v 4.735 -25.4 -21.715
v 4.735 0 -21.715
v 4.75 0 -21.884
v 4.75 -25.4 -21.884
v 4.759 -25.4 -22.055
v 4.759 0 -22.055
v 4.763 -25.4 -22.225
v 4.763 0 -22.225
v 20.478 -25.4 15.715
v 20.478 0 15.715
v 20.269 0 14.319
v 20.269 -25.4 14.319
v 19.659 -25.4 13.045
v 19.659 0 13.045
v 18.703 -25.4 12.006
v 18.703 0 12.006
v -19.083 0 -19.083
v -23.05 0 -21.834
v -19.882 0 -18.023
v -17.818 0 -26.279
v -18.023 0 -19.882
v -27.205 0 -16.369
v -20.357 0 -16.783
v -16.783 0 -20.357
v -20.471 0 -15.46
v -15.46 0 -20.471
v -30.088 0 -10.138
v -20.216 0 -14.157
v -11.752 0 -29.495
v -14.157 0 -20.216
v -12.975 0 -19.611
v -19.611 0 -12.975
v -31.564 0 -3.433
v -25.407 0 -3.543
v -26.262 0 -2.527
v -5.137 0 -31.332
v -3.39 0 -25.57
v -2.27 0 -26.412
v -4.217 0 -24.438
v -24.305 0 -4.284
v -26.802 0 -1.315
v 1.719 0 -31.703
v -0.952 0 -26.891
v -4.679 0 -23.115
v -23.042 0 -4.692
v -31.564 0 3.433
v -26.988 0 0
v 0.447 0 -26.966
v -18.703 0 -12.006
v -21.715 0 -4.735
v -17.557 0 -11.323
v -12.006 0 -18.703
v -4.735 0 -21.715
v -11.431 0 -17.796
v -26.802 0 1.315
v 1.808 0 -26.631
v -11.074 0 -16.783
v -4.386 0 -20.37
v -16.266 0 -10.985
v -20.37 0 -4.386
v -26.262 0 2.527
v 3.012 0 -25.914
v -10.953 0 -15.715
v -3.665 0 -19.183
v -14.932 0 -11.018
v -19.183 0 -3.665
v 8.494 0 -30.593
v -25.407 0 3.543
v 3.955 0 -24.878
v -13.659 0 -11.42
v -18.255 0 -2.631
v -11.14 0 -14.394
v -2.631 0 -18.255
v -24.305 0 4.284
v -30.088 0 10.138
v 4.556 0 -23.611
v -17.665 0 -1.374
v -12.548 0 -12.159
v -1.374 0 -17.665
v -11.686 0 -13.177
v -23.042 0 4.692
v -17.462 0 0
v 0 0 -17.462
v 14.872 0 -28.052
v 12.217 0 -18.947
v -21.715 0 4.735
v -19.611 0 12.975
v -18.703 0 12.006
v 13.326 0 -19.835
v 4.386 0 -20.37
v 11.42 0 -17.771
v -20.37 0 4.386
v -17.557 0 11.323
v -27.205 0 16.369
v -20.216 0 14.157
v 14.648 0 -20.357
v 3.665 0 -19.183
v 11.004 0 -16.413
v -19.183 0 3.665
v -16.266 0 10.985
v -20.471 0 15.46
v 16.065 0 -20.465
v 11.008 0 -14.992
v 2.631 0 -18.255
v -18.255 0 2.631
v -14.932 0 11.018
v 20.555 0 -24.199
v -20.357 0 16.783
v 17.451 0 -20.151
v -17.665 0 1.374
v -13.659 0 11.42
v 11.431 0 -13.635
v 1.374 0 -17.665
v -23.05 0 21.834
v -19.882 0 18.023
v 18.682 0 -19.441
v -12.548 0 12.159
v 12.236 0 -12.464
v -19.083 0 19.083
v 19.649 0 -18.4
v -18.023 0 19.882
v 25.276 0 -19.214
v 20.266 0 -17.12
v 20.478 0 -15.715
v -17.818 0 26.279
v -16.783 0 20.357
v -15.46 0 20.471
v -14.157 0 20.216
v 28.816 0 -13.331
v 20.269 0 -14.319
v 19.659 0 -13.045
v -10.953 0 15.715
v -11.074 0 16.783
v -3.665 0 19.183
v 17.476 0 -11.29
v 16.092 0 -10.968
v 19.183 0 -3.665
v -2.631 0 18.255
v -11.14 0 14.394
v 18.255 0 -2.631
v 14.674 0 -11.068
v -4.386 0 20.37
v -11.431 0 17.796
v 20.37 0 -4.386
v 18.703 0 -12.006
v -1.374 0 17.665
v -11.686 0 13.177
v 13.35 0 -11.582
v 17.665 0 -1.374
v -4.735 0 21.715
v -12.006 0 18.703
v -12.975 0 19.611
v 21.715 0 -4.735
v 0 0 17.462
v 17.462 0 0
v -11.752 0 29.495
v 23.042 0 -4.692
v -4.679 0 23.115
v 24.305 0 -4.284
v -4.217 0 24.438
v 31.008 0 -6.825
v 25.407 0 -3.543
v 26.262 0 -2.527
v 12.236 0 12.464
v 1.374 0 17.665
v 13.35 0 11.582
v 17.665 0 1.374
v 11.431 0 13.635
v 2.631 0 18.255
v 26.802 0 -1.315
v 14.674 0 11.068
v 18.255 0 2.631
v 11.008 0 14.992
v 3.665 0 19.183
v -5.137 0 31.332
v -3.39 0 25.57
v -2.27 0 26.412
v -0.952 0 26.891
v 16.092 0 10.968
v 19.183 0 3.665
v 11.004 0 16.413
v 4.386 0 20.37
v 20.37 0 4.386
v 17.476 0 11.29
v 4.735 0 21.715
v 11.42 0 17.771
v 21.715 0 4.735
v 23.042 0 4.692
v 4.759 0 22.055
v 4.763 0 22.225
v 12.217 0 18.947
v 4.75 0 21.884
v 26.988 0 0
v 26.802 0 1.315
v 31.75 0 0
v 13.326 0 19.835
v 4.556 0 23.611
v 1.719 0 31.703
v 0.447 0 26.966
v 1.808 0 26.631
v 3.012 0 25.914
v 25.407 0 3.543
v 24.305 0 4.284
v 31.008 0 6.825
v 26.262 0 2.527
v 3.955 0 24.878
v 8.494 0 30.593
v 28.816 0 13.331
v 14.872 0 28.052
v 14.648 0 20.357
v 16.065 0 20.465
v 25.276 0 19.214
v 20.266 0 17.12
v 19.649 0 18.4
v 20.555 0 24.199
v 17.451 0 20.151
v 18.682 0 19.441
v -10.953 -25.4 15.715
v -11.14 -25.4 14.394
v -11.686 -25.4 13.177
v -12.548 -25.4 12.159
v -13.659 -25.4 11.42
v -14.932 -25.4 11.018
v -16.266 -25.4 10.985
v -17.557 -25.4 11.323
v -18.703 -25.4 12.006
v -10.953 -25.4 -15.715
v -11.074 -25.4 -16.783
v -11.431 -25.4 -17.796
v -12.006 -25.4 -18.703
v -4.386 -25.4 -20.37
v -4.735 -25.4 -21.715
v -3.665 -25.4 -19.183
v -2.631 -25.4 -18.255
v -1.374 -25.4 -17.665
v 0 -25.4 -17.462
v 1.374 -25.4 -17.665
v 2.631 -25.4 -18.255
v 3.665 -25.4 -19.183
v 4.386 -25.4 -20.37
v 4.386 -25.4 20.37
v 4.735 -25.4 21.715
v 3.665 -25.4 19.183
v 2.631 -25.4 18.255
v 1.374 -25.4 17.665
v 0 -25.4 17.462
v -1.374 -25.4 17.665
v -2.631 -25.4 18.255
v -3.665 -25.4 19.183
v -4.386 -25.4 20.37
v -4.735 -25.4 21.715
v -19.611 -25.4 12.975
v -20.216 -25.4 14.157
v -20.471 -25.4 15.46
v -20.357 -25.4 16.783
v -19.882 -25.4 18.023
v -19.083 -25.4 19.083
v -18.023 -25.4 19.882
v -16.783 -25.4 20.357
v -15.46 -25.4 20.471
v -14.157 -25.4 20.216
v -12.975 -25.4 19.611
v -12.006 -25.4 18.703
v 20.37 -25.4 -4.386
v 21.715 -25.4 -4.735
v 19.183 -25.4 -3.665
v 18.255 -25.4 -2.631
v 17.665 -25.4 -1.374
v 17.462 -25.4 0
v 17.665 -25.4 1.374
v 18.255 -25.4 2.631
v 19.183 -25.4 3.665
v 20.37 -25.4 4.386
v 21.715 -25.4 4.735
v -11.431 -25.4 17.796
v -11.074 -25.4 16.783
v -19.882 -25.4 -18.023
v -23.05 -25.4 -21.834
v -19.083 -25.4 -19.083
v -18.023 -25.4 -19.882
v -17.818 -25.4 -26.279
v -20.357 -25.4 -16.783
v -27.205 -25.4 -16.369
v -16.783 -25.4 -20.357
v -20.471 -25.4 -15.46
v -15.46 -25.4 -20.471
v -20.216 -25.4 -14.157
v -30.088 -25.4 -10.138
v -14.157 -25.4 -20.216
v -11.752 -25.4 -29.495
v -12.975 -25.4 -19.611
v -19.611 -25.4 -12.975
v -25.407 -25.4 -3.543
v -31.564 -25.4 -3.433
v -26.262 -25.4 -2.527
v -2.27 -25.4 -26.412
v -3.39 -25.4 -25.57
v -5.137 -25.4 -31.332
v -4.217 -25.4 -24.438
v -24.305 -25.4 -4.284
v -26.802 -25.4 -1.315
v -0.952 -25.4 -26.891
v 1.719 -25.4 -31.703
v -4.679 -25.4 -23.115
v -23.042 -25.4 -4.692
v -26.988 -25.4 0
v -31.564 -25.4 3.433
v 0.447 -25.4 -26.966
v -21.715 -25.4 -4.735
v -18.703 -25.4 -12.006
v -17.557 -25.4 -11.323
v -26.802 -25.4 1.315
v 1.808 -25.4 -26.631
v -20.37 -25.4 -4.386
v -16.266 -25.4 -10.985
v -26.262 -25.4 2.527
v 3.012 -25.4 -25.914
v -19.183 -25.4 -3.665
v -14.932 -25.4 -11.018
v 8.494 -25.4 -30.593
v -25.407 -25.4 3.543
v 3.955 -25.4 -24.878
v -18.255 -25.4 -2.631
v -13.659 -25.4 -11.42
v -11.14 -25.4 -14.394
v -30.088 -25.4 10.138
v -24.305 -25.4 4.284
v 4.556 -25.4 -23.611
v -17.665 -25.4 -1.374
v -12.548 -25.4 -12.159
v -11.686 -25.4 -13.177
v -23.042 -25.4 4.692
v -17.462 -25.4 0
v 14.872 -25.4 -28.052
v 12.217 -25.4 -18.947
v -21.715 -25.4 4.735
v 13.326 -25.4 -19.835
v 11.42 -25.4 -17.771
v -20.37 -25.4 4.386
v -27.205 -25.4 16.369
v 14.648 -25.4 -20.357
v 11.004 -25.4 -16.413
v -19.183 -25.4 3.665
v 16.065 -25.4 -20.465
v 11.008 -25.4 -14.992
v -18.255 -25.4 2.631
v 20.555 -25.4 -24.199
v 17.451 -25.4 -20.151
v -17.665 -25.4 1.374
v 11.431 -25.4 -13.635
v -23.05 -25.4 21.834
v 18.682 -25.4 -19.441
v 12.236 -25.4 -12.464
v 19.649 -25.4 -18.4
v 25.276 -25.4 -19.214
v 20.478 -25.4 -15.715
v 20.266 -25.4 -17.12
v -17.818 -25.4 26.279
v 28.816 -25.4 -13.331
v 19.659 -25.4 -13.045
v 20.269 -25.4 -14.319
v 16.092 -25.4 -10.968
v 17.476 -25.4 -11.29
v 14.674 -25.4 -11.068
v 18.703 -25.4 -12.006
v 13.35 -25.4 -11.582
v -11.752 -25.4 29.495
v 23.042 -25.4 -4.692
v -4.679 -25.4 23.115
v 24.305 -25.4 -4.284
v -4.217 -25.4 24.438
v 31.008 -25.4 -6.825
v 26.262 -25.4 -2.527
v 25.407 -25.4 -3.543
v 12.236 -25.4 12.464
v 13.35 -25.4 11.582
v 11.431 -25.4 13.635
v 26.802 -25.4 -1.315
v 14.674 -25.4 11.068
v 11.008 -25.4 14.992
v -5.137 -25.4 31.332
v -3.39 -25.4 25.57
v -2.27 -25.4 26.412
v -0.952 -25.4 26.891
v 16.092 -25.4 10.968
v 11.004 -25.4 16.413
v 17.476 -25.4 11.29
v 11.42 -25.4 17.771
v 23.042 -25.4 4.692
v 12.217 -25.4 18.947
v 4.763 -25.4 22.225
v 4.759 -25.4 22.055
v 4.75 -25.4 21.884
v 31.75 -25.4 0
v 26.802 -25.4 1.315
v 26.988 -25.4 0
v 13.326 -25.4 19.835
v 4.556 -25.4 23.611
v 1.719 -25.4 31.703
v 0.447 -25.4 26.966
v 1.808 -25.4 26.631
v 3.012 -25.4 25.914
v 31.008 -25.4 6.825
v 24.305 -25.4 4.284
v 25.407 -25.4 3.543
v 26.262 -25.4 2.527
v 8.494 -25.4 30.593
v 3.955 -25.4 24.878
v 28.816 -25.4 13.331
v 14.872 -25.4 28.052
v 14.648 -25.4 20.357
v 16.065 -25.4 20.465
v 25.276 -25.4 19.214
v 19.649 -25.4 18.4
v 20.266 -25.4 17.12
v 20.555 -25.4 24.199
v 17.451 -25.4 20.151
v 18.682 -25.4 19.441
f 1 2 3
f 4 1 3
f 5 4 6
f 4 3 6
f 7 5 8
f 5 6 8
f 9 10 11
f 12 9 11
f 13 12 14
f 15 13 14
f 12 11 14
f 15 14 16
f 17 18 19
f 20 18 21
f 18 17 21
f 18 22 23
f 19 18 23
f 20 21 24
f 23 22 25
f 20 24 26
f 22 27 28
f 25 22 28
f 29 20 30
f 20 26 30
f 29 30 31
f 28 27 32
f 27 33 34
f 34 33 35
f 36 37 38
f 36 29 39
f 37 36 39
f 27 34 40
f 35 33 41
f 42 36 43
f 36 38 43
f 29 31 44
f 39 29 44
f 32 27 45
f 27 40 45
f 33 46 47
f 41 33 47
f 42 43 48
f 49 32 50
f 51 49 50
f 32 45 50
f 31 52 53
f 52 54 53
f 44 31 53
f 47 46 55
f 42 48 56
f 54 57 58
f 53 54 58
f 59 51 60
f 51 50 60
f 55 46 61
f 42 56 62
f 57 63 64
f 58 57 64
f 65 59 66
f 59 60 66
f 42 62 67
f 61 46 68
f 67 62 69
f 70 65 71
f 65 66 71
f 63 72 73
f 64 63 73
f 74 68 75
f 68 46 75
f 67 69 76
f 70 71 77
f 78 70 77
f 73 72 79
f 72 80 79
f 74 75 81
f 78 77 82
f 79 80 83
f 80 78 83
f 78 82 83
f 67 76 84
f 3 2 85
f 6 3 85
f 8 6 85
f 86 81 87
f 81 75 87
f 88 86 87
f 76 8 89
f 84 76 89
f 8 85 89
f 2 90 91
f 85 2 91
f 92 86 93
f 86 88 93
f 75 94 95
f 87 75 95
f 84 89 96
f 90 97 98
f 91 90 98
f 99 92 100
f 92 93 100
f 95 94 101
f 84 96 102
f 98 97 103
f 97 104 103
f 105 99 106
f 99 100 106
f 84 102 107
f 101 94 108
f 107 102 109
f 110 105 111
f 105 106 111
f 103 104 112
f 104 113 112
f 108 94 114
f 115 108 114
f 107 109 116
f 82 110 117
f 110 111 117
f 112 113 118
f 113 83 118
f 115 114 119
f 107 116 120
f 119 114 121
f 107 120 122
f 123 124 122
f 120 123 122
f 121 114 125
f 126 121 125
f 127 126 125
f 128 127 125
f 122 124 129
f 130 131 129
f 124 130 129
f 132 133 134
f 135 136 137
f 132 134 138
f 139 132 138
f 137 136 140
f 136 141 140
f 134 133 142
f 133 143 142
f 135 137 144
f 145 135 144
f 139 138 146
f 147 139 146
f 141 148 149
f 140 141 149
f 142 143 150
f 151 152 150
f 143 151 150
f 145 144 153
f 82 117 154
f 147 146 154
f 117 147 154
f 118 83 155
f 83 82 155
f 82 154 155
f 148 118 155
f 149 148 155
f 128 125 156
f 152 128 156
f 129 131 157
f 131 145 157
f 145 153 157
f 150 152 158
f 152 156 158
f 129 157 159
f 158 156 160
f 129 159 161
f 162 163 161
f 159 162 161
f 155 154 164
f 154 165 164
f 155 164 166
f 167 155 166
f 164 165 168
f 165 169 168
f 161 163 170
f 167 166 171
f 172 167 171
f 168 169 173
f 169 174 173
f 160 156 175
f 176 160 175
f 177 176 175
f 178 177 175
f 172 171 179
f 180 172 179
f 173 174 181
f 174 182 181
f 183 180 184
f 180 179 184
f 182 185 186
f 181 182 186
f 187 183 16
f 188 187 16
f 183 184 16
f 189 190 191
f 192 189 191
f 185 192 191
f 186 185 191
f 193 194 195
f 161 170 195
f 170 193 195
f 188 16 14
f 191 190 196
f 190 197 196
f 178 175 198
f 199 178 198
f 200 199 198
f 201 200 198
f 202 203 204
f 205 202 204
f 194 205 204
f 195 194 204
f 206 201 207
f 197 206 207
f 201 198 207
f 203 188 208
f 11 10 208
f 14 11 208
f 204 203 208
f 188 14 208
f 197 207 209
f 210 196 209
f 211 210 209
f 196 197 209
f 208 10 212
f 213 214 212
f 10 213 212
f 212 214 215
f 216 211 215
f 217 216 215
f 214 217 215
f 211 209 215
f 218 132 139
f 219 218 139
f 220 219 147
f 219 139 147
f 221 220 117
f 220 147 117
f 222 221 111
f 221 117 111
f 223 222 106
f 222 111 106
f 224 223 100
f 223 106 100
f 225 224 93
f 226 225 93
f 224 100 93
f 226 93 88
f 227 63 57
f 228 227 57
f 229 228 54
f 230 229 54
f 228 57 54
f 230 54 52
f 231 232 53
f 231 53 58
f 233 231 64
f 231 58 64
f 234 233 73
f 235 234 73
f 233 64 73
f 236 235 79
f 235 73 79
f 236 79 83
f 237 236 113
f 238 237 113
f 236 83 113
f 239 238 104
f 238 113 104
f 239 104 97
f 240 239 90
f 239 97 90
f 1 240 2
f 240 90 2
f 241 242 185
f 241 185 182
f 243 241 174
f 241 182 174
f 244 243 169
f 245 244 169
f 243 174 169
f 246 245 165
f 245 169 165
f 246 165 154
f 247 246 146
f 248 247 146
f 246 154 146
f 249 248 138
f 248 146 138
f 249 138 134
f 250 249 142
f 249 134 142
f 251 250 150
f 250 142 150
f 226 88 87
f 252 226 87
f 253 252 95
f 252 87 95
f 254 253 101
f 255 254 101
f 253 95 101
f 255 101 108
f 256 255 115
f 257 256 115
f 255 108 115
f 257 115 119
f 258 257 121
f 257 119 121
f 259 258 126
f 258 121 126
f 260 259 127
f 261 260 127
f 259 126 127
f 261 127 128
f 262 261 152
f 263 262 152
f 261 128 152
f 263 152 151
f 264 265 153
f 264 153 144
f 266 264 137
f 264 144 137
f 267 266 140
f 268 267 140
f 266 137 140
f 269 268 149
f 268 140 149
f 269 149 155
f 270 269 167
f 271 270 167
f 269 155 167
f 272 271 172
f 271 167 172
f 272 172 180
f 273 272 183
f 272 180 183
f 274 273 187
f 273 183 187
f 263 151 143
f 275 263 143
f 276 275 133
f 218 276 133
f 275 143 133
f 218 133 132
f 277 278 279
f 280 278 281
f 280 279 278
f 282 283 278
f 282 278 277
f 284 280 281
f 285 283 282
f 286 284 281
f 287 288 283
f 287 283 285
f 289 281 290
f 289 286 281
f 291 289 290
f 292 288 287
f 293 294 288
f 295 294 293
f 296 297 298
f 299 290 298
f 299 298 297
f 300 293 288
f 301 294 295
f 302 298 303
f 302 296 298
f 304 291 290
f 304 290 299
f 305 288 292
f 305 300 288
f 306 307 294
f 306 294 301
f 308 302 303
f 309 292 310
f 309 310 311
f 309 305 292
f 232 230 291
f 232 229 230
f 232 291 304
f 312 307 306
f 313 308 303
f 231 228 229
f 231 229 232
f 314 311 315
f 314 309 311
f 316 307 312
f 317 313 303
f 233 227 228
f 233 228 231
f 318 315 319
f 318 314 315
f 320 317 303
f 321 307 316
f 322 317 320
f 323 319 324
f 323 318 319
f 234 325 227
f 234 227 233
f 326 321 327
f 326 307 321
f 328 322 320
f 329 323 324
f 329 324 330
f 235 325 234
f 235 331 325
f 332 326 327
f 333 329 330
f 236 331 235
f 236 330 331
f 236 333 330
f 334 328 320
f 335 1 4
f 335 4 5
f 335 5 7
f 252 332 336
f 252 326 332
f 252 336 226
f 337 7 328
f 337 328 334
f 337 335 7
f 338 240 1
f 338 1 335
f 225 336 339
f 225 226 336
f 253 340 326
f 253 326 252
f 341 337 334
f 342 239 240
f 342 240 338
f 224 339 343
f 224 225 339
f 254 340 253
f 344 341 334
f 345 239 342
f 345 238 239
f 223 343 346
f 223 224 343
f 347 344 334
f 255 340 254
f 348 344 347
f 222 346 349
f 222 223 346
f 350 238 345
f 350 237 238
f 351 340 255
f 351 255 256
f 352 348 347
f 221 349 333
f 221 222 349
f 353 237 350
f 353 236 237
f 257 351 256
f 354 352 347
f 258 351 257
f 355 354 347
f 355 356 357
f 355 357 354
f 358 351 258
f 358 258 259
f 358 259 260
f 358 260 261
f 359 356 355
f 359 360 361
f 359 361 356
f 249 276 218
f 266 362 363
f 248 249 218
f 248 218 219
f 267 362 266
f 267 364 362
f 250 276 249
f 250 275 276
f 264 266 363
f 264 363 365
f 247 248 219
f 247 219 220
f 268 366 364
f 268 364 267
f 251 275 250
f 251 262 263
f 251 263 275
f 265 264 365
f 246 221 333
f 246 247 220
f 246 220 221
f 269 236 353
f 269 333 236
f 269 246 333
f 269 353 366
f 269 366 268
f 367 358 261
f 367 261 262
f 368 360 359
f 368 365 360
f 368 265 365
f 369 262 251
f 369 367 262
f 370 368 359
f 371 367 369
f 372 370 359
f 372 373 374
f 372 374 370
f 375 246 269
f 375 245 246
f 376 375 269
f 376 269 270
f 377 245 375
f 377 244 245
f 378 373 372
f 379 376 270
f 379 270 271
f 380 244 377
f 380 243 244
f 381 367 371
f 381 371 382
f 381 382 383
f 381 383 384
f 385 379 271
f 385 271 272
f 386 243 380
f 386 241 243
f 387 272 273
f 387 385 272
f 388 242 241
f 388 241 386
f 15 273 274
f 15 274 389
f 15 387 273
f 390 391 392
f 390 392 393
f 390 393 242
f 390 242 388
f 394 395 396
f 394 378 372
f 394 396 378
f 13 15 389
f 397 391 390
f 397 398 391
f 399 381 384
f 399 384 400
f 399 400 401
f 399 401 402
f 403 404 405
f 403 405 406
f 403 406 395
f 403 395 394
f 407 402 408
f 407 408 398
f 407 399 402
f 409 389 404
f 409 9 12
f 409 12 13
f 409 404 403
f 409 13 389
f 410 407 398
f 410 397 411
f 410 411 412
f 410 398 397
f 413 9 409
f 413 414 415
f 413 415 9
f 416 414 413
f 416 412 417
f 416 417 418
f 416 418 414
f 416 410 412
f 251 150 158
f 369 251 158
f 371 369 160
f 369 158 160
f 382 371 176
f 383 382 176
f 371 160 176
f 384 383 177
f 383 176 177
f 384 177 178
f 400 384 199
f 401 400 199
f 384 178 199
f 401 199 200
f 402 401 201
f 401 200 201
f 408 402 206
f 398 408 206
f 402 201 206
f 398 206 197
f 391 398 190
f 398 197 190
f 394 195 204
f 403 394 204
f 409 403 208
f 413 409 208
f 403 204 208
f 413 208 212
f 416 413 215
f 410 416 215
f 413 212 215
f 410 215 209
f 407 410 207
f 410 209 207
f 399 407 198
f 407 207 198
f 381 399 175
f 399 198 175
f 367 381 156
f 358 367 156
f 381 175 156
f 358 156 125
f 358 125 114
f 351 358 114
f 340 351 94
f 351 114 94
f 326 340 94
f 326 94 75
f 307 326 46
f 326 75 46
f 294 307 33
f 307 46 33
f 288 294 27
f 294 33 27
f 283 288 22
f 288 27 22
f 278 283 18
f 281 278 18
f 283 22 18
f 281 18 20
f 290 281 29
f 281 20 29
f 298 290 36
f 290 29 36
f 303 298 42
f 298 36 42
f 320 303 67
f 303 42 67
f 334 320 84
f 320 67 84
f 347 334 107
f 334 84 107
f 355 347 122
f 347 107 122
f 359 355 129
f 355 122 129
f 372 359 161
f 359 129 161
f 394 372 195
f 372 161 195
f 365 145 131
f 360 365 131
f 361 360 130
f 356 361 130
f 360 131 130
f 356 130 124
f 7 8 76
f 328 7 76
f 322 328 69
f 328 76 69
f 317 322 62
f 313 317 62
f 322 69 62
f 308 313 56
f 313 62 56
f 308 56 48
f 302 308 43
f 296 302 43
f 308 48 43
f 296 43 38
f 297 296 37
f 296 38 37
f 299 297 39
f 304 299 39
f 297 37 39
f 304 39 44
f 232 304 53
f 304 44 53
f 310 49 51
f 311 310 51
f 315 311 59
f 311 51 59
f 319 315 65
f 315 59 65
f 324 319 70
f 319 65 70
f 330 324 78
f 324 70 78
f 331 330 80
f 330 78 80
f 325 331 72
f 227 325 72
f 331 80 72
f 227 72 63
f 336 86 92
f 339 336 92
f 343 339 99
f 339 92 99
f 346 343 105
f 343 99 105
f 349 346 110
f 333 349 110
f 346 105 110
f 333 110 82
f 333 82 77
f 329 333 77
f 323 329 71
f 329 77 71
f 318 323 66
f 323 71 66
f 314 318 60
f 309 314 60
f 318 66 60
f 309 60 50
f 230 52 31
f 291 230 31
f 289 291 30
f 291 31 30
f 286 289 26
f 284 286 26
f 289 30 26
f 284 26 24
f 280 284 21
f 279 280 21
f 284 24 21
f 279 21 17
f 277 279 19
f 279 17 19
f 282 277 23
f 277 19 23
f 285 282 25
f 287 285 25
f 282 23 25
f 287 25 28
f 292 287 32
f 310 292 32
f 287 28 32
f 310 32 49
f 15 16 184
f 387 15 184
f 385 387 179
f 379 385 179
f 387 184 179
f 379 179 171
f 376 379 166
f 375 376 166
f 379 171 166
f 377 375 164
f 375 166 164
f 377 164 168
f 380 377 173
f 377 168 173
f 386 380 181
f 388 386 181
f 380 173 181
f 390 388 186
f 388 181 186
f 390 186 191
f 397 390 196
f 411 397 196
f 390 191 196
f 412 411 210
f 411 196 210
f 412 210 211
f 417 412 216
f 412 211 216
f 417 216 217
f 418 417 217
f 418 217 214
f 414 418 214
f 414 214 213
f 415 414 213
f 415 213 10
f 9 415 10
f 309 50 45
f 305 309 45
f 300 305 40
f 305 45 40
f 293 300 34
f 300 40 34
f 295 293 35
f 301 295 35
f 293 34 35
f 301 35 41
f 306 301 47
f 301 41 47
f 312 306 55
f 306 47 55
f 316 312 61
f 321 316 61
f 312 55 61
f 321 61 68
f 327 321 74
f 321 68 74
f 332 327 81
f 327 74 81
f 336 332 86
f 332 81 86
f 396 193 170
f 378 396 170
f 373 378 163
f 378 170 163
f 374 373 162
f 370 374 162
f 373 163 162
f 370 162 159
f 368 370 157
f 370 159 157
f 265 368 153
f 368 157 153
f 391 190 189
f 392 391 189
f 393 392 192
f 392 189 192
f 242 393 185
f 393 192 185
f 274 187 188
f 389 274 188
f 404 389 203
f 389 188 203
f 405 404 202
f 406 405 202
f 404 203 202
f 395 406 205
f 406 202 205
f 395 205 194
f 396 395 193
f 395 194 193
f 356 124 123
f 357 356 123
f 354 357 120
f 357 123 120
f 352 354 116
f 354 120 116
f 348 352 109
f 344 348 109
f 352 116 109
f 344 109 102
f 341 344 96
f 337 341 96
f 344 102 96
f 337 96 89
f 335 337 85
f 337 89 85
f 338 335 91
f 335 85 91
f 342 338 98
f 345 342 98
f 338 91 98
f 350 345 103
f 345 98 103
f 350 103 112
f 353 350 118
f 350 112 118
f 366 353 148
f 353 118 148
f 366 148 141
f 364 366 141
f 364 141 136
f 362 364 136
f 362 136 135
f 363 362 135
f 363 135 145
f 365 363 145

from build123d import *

# Parameters (mm, degrees)
F0_R     = 31.75
F1_DEPTH = 25.4


with BuildPart() as f1:
    # F0 (on Front) → F1 (new body)
    with BuildSketch(Plane.XZ):
        Circle(F0_R)
        with BuildLine():
            ThreePointArc((18.7028452874, 12.0064234124), (20.5332226101, 8.5051392843), (21.7147321429, 4.7350853175))
            ThreePointArc((21.7147321429, 4.7350853175), (25.4070791615, 3.543413391), (26.9875, 0))
            ThreePointArc((26.9875, 0), (25.4070791615, -3.543413391), (21.7147321429, -4.7350853175))
            ThreePointArc((21.7147321429, -4.7350853175), (20.5332226101, -8.5051392843), (18.7028452874, -12.0064234124))
            ThreePointArc((18.7028452874, -12.0064234124), (20.0113116188, -13.6594900802), (20.4779482119, -15.7154482119))
            ThreePointArc((20.4779482119, -15.7154482119), (17.2993004213, -20.2068642947), (12.0064234124, -18.7028452874))
            ThreePointArc((12.0064234124, -18.7028452874), (8.5051392843, -20.5332226101), (4.7350853175, -21.7147321429))
            ThreePointArc((4.7350853175, -21.7147321429), (4.7556413907, -21.969498116), (4.7625, -22.225))
            ThreePointArc((4.7625, -22.225), (-0.255501884, -26.9806413907), (-4.7350853175, -21.7147321429))
            ThreePointArc((-4.7350853175, -21.7147321429), (-8.5051392843, -20.5332226101), (-12.0064234124, -18.7028452874))
            ThreePointArc((-12.0064234124, -18.7028452874), (-19.0830442573, -19.0830442573), (-18.7028452874, -12.0064234124))
            ThreePointArc((-18.7028452874, -12.0064234124), (-20.5332226101, -8.5051392843), (-21.7147321429, -4.7350853175))
            ThreePointArc((-21.7147321429, -4.7350853175), (-26.9875, 0), (-21.7147321429, 4.7350853175))
            ThreePointArc((-21.7147321429, 4.7350853175), (-20.5332226101, 8.5051392843), (-18.7028452874, 12.0064234124))
            ThreePointArc((-18.7028452874, 12.0064234124), (-19.0830442573, 19.0830442573), (-12.0064234124, 18.7028452874))
            ThreePointArc((-12.0064234124, 18.7028452874), (-8.5051392843, 20.5332226101), (-4.7350853175, 21.7147321429))
            ThreePointArc((-4.7350853175, 21.7147321429), (-0.255501884, 26.9806413907), (4.7625, 22.225))
            ThreePointArc((4.7625, 22.225), (4.7556413907, 21.969498116), (4.7350853175, 21.7147321429))
            ThreePointArc((4.7350853175, 21.7147321429), (8.5051392843, 20.5332226101), (12.0064234124, 18.7028452874))
            ThreePointArc((12.0064234124, 18.7028452874), (17.2993004213, 20.2068642947), (20.4779482119, 15.7154482119))
            ThreePointArc((20.4779482119, 15.7154482119), (20.0113116188, 13.6594900802), (18.7028452874, 12.0064234124))
        make_face(mode=Mode.SUBTRACT)
        with BuildLine():
            ThreePointArc((21.7147321429, -4.7350853175), (17.4625, 0), (21.7147321429, 4.7350853175))
            ThreePointArc((21.7147321429, 4.7350853175), (20.5332226101, 8.5051392843), (18.7028452874, 12.0064234124))
            ThreePointArc((18.7028452874, 12.0064234124), (12.3478521665, 12.3478521665), (12.0064234124, 18.7028452874))
            ThreePointArc((12.0064234124, 18.7028452874), (8.5051392843, 20.5332226101), (4.7350853175, 21.7147321429))
            ThreePointArc((4.7350853175, 21.7147321429), (0, 17.4625), (-4.7350853175, 21.7147321429))
            ThreePointArc((-4.7350853175, 21.7147321429), (-8.5051392843, 20.5332226101), (-12.0064234124, 18.7028452874))
            ThreePointArc((-12.0064234124, 18.7028452874), (-11.2240321291, 17.2993004213), (-10.9529482119, 15.7154482119))
            ThreePointArc((-10.9529482119, 15.7154482119), (-13.6594900802, 11.4195848049), (-18.7028452874, 12.0064234124))
            ThreePointArc((-18.7028452874, 12.0064234124), (-20.5332226101, 8.5051392843), (-21.7147321429, 4.7350853175))
            ThreePointArc((-21.7147321429, 4.7350853175), (-18.681586609, 3.1820791615), (-17.4625, 0))
            ThreePointArc((-17.4625, 0), (-18.681586609, -3.1820791615), (-21.7147321429, -4.7350853175))
            ThreePointArc((-21.7147321429, -4.7350853175), (-20.5332226101, -8.5051392843), (-18.7028452874, -12.0064234124))
            ThreePointArc((-18.7028452874, -12.0064234124), (-13.6594900802, -11.4195848049), (-10.9529482119, -15.7154482119))
            ThreePointArc((-10.9529482119, -15.7154482119), (-11.2240321291, -17.2993004213), (-12.0064234124, -18.7028452874))
            ThreePointArc((-12.0064234124, -18.7028452874), (-8.5051392843, -20.5332226101), (-4.7350853175, -21.7147321429))
            ThreePointArc((-4.7350853175, -21.7147321429), (0, -17.4625), (4.7350853175, -21.7147321429))
            ThreePointArc((4.7350853175, -21.7147321429), (8.5051392843, -20.5332226101), (12.0064234124, -18.7028452874))
            ThreePointArc((12.0064234124, -18.7028452874), (12.3478521665, -12.3478521665), (18.7028452874, -12.0064234124))
            ThreePointArc((18.7028452874, -12.0064234124), (20.5332226101, -8.5051392843), (21.7147321429, -4.7350853175))
        make_face()
    extrude(amount=F1_DEPTH)


solid = f1.part
